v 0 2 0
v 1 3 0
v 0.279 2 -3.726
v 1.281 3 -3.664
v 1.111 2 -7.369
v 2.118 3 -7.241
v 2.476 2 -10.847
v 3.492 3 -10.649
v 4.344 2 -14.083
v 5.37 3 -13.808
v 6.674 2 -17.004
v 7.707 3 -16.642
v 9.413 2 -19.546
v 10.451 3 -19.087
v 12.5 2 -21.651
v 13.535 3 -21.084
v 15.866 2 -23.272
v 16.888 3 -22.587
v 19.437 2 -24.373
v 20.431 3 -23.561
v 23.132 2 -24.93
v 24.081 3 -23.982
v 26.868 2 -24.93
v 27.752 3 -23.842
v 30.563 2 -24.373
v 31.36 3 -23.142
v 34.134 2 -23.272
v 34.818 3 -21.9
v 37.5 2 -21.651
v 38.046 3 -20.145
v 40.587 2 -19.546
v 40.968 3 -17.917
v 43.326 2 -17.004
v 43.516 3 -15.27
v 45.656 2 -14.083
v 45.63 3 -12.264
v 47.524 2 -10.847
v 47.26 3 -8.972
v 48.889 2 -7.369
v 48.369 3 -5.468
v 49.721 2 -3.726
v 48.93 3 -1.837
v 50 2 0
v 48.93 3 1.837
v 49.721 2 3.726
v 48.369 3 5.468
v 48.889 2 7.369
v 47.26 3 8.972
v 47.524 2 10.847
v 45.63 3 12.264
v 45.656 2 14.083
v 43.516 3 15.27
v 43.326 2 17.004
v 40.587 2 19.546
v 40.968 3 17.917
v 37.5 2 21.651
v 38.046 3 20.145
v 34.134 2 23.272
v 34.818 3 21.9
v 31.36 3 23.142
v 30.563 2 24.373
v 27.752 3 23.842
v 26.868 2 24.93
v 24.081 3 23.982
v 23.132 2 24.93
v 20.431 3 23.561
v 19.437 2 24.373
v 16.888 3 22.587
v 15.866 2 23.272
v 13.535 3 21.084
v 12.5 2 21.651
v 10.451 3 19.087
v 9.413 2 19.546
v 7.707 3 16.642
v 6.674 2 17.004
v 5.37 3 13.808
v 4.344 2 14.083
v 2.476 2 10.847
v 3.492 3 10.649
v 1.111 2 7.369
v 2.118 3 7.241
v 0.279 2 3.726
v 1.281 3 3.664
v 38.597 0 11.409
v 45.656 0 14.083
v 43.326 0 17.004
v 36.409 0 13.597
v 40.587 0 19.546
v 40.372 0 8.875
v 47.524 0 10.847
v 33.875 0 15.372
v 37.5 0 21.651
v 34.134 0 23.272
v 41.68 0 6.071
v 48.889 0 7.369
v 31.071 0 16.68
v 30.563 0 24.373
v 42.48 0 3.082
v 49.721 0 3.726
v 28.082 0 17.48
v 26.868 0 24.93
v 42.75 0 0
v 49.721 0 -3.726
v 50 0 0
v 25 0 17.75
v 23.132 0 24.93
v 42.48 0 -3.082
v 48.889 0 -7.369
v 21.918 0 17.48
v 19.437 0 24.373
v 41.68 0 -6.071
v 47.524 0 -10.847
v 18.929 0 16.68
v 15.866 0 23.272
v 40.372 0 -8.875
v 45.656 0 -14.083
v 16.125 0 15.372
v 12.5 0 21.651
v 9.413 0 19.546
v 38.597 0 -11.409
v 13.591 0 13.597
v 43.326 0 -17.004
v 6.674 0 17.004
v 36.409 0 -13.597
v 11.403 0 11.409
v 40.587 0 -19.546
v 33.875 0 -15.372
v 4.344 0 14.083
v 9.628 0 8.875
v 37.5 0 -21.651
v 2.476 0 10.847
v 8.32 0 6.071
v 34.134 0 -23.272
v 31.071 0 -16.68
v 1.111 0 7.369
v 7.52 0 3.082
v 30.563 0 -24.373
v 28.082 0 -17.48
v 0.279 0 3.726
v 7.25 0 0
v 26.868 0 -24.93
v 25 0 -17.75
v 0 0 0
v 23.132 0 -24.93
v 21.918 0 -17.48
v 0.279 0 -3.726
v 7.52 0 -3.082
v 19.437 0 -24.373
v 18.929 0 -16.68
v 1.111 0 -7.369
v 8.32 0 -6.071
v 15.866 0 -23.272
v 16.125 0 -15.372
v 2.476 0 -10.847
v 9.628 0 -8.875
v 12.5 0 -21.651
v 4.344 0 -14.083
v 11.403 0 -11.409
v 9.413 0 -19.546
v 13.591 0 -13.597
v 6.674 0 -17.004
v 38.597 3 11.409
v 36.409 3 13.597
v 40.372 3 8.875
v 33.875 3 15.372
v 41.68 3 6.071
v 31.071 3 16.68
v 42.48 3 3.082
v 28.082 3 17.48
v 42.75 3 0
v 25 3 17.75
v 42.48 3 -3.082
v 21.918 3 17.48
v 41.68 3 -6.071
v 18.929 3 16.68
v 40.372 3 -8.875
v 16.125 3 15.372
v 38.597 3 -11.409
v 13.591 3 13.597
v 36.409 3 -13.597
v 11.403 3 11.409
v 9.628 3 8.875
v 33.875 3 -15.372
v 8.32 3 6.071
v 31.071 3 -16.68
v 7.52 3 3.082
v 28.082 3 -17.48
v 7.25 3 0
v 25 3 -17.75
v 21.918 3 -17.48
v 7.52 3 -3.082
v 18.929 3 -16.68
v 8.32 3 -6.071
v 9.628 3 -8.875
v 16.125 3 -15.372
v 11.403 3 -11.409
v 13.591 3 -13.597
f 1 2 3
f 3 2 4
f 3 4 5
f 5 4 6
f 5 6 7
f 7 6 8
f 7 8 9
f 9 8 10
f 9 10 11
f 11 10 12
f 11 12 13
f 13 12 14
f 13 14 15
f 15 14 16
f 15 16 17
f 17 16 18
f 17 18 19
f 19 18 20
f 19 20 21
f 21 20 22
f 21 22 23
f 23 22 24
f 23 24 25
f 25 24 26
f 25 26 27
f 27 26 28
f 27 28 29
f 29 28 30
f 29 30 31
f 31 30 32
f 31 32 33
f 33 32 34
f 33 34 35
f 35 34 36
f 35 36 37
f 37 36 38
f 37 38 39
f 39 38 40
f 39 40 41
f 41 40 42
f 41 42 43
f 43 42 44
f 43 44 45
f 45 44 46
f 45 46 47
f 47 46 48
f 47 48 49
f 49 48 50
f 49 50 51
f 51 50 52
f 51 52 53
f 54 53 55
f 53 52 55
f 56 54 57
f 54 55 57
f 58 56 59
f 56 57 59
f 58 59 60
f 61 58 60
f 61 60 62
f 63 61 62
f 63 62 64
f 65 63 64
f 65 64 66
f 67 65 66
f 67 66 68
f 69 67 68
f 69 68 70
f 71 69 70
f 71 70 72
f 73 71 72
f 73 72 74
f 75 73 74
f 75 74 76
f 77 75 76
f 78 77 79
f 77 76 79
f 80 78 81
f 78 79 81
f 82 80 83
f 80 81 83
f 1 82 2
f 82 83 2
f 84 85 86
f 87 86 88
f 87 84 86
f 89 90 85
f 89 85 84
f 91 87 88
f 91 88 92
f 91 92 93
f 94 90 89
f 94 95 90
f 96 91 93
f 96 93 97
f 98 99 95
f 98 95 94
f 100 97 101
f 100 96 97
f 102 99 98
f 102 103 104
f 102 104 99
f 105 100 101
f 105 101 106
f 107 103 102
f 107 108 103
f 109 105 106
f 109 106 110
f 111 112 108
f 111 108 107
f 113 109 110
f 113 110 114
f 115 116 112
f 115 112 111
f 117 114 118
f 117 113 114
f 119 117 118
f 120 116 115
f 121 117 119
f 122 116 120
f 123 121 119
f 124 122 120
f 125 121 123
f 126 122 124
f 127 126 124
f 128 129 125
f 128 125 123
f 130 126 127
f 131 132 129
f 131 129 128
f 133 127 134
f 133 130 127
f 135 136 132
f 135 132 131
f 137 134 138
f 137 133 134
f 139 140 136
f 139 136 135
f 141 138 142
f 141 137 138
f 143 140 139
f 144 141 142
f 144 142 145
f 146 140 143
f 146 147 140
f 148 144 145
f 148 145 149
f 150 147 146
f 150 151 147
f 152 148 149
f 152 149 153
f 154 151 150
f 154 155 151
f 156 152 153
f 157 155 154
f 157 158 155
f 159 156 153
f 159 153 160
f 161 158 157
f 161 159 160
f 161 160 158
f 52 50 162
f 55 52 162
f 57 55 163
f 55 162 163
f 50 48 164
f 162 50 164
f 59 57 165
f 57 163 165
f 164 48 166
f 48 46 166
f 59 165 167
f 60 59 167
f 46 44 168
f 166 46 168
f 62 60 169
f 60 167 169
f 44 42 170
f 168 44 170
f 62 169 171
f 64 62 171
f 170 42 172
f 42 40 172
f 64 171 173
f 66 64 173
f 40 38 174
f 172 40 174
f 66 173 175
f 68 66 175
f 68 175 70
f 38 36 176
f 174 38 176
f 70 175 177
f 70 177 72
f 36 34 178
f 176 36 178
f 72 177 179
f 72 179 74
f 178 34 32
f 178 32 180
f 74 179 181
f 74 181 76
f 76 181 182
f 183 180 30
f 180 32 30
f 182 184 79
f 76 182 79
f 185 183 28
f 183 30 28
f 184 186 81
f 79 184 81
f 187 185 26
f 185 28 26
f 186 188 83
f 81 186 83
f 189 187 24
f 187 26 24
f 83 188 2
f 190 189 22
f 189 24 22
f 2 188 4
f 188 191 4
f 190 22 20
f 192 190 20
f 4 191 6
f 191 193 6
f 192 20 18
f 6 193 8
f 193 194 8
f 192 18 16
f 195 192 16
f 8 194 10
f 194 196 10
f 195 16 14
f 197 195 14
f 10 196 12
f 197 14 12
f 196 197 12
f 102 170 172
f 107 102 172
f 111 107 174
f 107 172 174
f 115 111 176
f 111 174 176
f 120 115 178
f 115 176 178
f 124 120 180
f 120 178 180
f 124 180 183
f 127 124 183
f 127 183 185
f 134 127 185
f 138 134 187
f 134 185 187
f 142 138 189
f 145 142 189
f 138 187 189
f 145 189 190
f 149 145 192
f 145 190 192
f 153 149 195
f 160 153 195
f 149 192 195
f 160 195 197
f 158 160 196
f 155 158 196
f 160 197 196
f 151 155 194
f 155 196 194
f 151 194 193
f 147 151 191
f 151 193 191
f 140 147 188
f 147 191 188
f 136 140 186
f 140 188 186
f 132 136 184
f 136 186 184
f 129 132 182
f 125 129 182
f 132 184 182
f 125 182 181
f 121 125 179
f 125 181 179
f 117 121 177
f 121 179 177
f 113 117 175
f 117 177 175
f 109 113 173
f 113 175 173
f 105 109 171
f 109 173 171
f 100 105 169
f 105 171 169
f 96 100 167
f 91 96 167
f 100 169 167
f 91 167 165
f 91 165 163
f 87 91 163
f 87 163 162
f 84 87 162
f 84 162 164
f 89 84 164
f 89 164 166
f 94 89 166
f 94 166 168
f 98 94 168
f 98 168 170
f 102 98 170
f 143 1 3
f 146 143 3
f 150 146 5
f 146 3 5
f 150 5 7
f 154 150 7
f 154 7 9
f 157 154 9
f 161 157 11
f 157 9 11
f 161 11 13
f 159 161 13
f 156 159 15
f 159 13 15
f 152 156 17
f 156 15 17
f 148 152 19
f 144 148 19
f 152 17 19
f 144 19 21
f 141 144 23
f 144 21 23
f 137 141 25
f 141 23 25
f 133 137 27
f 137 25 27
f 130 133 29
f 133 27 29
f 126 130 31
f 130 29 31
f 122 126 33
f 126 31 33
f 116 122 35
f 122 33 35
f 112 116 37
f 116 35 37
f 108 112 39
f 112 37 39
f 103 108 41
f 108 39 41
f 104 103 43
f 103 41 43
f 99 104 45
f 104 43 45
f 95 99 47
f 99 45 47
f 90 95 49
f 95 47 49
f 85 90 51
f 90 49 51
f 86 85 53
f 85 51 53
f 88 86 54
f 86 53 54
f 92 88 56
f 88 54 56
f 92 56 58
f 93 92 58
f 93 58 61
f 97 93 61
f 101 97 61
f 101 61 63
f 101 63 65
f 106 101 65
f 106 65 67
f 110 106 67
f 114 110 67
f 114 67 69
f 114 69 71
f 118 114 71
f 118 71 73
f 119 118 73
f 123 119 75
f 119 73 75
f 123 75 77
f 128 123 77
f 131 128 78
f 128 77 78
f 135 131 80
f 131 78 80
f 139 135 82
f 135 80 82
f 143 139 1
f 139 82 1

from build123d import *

# Parameters (mm, degrees)
SKETCH1_W          = 25
SKETCH1_H          = 3
SKETCH2_R          = 17.75
CUT_EXTRUDE1_DEPTH = 3
CHAMFER1_SIZE      = 1


with BuildPart() as part:
    # Sketch1 → Revolve1 (revolve)
    with BuildSketch(Plane.XY):
        with Locations((12.5, 1.5)):
            Rectangle(SKETCH1_W, SKETCH1_H)
    revolve(axis=Axis((25, 3, 0), (0, -1, 0)))

    # Sketch2 → Cut-Extrude1 (cut)
    with BuildSketch(Plane(origin=(0, 3, 0), x_dir=(1, 0, 0), z_dir=(0, 1, 0))):
        with Locations((25, 0)):
            Circle(SKETCH2_R)
    extrude(amount=-CUT_EXTRUDE1_DEPTH, mode=Mode.SUBTRACT)

    # Chamfer1
    chamfer1_edges = [part.edges().sort_by_distance(p)[0] for p in [
        (50, 3, 0),
    ]]
    chamfer(chamfer1_edges, length=CHAMFER1_SIZE)


solid = part.part
